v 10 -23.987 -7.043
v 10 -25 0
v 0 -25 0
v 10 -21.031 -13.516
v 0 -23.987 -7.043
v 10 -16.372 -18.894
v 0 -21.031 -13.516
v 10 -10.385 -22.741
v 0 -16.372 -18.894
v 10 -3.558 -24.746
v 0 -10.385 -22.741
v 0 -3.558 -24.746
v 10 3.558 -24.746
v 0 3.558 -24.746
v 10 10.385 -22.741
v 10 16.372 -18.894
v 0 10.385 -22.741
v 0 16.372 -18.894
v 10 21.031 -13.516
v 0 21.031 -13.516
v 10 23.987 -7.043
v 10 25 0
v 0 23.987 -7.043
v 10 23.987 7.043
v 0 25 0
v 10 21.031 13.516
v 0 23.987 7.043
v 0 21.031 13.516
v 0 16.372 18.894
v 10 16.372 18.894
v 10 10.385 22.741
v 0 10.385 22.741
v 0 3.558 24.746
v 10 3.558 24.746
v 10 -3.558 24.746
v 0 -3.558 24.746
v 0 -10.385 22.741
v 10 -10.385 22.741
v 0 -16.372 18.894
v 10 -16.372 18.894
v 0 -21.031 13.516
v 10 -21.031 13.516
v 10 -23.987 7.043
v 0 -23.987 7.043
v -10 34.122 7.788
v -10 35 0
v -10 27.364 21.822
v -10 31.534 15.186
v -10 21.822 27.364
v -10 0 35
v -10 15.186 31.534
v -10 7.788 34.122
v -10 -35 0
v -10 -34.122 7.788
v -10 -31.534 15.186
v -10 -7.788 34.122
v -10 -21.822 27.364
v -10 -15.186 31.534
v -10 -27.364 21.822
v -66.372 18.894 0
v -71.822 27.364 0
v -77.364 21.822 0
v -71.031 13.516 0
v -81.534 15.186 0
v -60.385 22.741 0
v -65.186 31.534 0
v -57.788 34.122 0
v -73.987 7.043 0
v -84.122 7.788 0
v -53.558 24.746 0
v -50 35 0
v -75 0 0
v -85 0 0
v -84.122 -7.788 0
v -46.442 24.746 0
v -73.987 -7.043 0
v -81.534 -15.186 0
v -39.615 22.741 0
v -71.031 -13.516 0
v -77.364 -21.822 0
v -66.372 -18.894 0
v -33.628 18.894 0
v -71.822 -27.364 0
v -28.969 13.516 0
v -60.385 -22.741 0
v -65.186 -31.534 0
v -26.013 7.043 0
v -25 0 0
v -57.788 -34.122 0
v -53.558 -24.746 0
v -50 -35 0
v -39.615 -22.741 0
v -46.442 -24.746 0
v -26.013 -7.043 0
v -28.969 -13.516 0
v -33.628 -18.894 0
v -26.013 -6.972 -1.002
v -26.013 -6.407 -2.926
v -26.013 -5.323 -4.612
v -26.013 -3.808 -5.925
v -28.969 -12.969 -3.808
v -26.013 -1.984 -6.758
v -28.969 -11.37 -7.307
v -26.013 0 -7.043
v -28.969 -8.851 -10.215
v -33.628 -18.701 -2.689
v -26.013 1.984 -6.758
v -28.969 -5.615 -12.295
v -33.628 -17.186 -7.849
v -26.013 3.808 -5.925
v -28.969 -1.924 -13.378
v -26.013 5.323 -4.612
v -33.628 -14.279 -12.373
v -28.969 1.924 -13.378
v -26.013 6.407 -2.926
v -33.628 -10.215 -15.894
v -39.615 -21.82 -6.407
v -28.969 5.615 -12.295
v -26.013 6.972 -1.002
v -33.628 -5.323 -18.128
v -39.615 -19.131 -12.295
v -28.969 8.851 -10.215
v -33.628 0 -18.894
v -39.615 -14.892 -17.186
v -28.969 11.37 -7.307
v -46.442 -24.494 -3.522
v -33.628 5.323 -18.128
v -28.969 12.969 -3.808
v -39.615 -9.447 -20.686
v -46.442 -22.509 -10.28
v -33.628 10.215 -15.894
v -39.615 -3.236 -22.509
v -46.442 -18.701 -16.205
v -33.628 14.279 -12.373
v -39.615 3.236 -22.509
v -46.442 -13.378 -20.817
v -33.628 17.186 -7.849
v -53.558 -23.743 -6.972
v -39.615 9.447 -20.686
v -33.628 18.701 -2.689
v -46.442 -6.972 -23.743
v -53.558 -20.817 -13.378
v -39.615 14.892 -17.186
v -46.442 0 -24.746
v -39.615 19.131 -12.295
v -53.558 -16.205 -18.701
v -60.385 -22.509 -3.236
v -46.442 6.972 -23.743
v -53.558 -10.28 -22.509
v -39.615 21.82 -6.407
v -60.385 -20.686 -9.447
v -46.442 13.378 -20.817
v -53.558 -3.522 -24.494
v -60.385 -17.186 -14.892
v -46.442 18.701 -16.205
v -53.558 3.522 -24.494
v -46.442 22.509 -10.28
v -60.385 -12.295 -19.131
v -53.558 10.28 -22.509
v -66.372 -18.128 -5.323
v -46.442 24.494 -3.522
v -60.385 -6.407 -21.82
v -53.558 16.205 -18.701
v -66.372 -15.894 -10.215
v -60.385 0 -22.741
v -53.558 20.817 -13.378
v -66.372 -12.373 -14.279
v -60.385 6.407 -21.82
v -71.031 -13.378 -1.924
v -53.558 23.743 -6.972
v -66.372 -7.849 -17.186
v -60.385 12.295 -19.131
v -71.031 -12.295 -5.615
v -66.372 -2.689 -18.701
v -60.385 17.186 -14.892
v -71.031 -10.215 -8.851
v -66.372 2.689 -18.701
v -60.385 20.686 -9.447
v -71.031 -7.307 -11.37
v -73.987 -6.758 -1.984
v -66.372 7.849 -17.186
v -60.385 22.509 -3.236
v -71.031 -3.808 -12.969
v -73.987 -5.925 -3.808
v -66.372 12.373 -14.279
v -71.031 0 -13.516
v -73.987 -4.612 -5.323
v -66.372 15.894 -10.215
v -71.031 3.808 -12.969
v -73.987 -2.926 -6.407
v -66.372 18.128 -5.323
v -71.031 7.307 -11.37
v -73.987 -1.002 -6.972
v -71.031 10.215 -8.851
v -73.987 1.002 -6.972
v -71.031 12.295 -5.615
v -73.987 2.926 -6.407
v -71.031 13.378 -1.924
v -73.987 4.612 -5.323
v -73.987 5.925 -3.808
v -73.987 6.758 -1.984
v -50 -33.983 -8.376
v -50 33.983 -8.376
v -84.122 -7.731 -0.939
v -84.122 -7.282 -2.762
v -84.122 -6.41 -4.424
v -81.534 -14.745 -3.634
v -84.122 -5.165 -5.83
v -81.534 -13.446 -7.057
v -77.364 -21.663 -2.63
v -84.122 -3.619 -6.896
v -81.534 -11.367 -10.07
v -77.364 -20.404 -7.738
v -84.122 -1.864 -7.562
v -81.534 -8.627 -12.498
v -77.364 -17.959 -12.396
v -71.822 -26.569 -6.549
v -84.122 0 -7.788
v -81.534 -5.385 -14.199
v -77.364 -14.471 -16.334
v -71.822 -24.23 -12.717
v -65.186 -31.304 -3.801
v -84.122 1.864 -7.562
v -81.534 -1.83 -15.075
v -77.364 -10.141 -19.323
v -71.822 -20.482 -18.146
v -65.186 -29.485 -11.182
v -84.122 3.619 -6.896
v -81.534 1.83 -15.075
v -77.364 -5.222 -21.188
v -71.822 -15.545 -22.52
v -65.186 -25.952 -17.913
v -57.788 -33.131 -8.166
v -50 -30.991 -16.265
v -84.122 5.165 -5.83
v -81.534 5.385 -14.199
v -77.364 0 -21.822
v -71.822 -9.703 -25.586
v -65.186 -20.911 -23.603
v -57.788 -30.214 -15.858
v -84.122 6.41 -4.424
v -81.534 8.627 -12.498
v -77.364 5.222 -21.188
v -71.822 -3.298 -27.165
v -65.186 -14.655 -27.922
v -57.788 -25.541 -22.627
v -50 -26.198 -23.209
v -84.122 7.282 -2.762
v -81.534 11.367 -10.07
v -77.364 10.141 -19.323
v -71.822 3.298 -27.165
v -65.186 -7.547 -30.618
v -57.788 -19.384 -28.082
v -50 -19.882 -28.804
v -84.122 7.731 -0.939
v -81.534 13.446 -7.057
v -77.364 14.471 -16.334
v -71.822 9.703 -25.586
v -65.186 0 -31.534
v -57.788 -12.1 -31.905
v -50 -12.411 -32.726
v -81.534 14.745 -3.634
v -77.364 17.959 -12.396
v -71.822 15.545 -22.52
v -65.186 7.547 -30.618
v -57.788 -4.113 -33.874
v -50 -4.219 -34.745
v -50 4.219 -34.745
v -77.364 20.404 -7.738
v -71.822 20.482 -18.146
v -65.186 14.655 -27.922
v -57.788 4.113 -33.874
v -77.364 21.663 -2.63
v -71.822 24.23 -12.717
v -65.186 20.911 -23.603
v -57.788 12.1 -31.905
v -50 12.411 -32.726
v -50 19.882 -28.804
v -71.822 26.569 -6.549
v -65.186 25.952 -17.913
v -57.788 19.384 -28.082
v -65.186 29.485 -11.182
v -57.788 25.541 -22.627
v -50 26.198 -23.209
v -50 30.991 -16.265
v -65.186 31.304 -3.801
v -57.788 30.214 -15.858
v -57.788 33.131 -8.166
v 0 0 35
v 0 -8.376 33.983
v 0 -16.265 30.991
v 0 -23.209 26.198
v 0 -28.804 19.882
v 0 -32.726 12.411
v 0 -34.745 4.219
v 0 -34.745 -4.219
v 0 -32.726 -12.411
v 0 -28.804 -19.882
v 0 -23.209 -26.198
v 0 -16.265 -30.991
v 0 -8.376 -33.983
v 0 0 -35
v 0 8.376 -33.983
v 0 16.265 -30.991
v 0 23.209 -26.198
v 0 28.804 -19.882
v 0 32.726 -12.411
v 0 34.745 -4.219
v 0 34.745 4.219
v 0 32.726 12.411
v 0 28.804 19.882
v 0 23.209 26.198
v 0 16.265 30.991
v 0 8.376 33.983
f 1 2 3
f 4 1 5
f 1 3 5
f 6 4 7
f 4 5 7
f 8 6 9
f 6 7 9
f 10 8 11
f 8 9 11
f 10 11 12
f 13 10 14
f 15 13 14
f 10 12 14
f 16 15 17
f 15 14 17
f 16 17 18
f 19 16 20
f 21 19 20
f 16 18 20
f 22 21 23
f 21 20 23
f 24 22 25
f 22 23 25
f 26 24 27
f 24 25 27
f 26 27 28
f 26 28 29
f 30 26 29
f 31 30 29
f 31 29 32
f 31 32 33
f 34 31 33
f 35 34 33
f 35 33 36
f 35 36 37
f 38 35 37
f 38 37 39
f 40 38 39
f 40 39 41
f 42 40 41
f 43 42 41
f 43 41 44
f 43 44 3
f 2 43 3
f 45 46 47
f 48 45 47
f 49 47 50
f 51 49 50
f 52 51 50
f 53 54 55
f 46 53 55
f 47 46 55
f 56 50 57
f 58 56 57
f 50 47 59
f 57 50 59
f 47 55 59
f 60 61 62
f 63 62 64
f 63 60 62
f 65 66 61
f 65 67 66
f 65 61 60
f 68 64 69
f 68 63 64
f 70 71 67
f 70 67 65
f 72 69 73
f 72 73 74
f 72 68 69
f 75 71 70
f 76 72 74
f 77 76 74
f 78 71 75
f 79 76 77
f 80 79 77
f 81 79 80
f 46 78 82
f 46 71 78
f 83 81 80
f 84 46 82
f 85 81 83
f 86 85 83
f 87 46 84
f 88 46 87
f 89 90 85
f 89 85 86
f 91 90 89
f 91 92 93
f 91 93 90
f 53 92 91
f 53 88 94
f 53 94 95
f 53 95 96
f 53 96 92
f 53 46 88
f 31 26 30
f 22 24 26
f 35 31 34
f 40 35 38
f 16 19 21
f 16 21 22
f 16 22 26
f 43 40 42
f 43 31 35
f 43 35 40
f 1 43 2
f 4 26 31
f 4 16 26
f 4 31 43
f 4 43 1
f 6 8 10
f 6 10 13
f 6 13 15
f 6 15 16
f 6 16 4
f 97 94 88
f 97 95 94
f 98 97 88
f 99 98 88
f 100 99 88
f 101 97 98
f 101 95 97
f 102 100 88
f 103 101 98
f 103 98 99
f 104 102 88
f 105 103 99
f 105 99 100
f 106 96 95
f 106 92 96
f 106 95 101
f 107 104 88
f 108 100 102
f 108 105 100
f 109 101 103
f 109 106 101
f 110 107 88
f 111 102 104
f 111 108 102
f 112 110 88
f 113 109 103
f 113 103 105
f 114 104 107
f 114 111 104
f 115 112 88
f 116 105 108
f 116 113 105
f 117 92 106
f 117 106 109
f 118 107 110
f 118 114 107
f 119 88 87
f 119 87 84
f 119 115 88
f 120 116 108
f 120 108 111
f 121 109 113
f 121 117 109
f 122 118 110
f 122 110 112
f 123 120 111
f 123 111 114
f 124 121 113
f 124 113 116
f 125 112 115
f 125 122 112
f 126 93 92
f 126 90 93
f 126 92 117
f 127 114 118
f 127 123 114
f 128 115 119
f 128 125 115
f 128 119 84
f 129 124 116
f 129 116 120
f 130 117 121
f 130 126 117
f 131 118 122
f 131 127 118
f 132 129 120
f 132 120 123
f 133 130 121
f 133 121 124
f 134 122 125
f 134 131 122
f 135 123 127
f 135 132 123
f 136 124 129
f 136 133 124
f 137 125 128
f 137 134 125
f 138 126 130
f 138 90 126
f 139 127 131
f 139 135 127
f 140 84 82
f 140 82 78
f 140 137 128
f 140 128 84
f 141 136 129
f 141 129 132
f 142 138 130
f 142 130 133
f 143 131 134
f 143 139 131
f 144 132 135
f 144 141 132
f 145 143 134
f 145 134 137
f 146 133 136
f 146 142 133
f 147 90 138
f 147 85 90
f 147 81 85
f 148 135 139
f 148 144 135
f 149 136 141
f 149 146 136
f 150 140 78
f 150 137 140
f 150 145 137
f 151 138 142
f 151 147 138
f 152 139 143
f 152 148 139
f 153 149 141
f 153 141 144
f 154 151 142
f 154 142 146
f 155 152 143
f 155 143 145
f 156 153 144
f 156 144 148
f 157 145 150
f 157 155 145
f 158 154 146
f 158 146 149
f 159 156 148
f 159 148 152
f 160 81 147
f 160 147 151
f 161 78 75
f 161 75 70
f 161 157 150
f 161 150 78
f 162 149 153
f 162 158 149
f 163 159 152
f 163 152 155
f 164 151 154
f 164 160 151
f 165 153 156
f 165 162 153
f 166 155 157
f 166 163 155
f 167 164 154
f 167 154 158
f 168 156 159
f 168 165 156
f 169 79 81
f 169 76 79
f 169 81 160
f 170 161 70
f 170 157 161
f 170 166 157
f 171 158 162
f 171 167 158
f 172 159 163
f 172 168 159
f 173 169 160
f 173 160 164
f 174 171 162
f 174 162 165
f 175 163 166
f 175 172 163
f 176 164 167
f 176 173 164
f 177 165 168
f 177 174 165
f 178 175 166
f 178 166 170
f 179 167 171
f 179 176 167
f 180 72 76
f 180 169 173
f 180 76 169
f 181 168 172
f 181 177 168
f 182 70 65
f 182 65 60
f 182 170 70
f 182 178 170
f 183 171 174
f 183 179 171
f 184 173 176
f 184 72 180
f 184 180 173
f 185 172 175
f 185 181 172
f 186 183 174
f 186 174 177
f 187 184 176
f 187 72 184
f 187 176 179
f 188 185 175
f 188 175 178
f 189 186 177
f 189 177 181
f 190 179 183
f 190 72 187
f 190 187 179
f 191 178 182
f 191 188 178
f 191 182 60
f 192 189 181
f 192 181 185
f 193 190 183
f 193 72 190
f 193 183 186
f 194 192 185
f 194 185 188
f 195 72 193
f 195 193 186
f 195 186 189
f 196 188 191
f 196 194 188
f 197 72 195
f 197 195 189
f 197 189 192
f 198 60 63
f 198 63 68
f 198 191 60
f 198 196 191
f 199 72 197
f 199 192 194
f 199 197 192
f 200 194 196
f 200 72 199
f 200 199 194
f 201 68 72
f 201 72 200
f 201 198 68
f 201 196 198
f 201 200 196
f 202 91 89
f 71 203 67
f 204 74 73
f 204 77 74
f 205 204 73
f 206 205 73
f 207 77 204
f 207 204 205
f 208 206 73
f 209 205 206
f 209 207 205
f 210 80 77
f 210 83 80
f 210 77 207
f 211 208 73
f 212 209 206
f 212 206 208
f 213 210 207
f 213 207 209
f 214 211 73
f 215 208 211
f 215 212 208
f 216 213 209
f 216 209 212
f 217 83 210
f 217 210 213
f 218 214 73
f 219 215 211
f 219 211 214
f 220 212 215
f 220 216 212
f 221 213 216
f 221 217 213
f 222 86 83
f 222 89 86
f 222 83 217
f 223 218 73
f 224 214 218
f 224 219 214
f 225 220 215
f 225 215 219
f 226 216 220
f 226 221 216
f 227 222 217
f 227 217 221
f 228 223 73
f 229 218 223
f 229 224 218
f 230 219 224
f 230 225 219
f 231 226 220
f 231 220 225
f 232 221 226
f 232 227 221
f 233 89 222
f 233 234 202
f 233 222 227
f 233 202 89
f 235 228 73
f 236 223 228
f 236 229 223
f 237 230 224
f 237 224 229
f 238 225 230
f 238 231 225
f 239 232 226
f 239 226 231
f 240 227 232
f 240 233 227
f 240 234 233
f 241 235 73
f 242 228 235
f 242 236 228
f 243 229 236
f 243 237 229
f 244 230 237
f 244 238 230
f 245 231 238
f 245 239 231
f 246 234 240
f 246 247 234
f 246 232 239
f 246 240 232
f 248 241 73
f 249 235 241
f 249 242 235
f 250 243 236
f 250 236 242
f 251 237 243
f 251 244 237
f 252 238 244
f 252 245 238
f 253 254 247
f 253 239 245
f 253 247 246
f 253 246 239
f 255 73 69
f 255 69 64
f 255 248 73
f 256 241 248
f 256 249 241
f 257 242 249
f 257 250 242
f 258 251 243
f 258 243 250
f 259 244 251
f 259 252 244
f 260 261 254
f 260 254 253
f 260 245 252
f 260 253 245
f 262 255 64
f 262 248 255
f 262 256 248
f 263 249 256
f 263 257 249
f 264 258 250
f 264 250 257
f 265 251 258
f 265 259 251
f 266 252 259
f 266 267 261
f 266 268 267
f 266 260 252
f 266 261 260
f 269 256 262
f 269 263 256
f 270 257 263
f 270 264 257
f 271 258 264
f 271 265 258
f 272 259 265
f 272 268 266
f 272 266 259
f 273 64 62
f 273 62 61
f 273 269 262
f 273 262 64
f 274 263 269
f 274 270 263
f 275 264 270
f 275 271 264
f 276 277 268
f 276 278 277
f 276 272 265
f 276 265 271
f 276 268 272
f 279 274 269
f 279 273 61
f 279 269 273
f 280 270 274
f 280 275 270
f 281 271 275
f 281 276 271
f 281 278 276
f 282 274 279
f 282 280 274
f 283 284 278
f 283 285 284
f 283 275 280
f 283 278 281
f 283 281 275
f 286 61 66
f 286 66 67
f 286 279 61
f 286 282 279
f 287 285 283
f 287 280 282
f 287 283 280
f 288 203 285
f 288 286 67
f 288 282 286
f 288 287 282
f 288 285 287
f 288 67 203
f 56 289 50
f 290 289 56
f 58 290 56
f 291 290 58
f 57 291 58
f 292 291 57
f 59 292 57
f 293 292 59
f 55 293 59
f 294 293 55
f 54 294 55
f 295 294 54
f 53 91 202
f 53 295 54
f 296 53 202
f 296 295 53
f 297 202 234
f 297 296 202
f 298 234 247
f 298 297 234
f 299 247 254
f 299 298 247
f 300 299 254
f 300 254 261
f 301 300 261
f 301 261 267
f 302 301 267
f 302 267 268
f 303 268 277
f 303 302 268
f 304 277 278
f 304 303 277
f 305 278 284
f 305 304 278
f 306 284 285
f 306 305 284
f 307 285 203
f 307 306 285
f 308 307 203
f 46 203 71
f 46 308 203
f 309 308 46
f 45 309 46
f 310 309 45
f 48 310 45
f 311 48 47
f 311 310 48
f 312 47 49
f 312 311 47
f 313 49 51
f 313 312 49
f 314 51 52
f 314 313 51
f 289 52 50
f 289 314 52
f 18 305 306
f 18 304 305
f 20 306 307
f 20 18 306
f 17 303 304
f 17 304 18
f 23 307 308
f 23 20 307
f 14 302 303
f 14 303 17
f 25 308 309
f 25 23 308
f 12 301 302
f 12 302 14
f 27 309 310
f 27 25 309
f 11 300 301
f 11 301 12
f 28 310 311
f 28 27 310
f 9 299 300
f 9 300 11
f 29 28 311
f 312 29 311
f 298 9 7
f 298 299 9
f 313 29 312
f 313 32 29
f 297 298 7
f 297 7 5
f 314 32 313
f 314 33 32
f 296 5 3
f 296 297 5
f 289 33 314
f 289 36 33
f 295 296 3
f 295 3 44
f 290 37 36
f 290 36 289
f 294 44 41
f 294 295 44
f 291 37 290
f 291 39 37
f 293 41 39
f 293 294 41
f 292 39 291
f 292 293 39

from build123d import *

# Parameters (mm, degrees)
REVOLVE1_ANGLE      = 180
SKETCH4_R           = 25
BOSS_EXTRUDE1_DEPTH = 10
SKETCH5_R           = 35
BOSS_EXTRUDE2_DEPTH = 10


# Read off the part's stored shape, not the designer's step: Revolve1
with BuildPart() as part:
    # Revolve1 outline → Revolve1 (revolve)
    with BuildSketch(Plane(origin=(0, 0, 0), x_dir=(0, -1, 0), z_dir=(0, 0, 1))):
        with BuildLine():
            Line((0, -75), (0, -85))
            ThreePointArc((0, -85), (24.748737342, -74.748737342), (35, -50))
            Line((35, -50), (35, 0))
            Line((35, 0), (0, 0))
            Line((0, 0), (0, -25))
            ThreePointArc((0, -25), (25, -50), (0, -75))
        make_face()
    revolve(axis=Axis((0, 0, 0), (1, 0, 0)), revolution_arc=REVOLVE1_ANGLE)

    # Sketch4 → Boss-Extrude1 (add)
    with BuildSketch(Plane(origin=(0, 0, 0), x_dir=(0, 0, -1), z_dir=(1, 0, 0))):
        with Locations(Location((0, 0, 0), (0, 0, 270))):
            Circle(SKETCH4_R)
    extrude(amount=BOSS_EXTRUDE1_DEPTH)

    # Sketch5 → Boss-Extrude2 (add)
    with BuildSketch(Plane(origin=(0, 0, 0), x_dir=(0, 0, -1), z_dir=(1, 0, 0))):
        with Locations(Location((0, 0, 0), (0, 0, 180))):
            Circle(SKETCH5_R)
    extrude(amount=-BOSS_EXTRUDE2_DEPTH)


solid = part.part
